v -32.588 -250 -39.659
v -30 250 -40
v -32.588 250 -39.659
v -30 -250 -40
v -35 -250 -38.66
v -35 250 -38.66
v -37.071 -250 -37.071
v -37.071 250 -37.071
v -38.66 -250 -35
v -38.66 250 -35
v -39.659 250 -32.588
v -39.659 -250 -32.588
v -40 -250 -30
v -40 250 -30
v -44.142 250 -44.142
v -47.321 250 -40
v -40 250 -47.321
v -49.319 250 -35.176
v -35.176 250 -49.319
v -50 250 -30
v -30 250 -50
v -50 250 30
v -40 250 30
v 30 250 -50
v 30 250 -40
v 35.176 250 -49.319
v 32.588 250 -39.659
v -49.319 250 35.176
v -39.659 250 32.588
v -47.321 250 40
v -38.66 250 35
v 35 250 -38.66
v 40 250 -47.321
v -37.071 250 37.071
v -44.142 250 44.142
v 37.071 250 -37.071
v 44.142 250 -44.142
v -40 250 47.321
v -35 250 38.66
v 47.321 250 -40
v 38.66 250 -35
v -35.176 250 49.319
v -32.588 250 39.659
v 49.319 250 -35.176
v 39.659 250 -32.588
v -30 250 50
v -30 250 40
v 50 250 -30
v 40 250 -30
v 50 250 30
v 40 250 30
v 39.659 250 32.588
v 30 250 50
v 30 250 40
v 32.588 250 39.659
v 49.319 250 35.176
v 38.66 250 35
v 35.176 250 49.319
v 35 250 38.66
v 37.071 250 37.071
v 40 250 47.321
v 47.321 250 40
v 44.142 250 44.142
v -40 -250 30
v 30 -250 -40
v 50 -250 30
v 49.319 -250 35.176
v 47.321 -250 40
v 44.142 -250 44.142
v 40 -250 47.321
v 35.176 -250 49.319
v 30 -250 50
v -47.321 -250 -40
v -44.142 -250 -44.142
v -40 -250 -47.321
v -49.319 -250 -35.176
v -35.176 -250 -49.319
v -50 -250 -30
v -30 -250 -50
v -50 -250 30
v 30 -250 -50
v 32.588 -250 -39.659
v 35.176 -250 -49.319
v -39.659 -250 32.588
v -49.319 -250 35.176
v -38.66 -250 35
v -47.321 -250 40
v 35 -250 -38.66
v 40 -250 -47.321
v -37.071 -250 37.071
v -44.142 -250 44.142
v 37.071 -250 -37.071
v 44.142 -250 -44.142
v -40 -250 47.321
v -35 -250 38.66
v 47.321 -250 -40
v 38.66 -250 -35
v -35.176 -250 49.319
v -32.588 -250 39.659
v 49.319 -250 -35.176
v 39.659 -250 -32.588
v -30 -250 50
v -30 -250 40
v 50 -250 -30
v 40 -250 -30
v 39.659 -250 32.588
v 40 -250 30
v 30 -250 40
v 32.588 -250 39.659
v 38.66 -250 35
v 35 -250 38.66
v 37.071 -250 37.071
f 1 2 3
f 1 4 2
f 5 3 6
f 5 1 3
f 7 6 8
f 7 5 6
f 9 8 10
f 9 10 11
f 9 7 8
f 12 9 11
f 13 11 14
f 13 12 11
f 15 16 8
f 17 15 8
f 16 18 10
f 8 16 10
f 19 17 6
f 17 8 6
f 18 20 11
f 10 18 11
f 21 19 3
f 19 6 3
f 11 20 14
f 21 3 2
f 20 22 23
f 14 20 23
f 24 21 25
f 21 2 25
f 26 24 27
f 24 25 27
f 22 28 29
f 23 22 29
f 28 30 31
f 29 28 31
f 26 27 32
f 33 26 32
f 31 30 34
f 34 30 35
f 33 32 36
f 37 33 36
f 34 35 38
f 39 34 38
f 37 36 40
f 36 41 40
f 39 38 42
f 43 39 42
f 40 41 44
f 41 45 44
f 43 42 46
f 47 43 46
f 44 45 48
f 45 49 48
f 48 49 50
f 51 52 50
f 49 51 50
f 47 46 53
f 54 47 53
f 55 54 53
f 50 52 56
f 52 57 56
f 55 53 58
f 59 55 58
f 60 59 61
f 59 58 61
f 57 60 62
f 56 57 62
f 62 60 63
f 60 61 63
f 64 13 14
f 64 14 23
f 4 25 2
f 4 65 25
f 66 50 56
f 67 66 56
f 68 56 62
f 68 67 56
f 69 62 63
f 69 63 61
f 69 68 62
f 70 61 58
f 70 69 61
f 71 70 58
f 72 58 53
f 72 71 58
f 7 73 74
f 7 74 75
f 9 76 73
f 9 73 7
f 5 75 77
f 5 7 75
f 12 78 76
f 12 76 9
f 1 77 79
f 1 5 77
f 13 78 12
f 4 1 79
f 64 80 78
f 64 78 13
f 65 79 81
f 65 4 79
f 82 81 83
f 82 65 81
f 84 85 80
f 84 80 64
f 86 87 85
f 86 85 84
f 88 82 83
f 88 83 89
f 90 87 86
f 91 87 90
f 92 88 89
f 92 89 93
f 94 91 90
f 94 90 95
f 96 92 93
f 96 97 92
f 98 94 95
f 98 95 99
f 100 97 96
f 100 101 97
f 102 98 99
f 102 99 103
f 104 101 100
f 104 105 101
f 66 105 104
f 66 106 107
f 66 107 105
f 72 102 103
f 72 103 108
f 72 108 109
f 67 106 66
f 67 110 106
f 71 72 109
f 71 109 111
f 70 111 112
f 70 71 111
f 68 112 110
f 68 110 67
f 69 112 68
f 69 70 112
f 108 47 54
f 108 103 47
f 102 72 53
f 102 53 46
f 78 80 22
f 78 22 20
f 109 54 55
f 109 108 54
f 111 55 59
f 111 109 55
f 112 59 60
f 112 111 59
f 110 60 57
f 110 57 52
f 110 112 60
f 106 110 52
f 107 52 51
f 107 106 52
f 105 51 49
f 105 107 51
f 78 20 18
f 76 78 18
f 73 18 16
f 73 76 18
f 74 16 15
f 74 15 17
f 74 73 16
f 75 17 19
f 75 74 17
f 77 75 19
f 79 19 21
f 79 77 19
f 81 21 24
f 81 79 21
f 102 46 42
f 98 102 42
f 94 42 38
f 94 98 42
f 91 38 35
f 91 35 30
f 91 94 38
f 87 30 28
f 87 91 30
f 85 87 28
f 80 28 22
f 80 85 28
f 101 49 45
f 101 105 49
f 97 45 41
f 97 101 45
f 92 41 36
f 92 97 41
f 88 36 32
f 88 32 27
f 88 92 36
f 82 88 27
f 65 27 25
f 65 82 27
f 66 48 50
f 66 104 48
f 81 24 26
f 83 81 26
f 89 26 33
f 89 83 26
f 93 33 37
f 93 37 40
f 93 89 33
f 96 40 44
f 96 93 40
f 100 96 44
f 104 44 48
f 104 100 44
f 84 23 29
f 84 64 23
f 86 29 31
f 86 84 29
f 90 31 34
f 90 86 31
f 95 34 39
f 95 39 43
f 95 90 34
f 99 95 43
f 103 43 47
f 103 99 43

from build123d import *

# Parameters (mm, degrees)
F1_DEPTH = 250


with BuildPart() as f1:
    # F0 (on Front) → F1 (new body, symmetric)
    with BuildSketch(Plane.XZ):
        with BuildLine():
            ThreePointArc((50, 30), (44.1421356237, 44.1421356237), (30, 50))
            Line((30, 50), (-30, 50))
            ThreePointArc((-30, 50), (-44.1421356237, 44.1421356237), (-50, 30))
            Line((-50, 30), (-50, -30))
            ThreePointArc((-50, -30), (-44.1421356237, -44.1421356237), (-30, -50))
            Line((-30, -50), (30, -50))
            ThreePointArc((30, -50), (44.1421356237, -44.1421356237), (50, -30))
            Line((50, -30), (50, 30))
        make_face()
        with BuildLine():
            Line((-40, -30), (-40, 30))
            ThreePointArc((-40, 30), (-37.0710678119, 37.0710678119), (-30, 40))
            Line((-30, 40), (30, 40))
            ThreePointArc((30, 40), (37.0710678119, 37.0710678119), (40, 30))
            Line((40, 30), (40, -30))
            ThreePointArc((40, -30), (37.0710678119, -37.0710678119), (30, -40))
            Line((30, -40), (-30, -40))
            ThreePointArc((-30, -40), (-37.0710678119, -37.0710678119), (-40, -30))
        make_face(mode=Mode.SUBTRACT)
    extrude(amount=F1_DEPTH, both=True)


solid = f1.part
